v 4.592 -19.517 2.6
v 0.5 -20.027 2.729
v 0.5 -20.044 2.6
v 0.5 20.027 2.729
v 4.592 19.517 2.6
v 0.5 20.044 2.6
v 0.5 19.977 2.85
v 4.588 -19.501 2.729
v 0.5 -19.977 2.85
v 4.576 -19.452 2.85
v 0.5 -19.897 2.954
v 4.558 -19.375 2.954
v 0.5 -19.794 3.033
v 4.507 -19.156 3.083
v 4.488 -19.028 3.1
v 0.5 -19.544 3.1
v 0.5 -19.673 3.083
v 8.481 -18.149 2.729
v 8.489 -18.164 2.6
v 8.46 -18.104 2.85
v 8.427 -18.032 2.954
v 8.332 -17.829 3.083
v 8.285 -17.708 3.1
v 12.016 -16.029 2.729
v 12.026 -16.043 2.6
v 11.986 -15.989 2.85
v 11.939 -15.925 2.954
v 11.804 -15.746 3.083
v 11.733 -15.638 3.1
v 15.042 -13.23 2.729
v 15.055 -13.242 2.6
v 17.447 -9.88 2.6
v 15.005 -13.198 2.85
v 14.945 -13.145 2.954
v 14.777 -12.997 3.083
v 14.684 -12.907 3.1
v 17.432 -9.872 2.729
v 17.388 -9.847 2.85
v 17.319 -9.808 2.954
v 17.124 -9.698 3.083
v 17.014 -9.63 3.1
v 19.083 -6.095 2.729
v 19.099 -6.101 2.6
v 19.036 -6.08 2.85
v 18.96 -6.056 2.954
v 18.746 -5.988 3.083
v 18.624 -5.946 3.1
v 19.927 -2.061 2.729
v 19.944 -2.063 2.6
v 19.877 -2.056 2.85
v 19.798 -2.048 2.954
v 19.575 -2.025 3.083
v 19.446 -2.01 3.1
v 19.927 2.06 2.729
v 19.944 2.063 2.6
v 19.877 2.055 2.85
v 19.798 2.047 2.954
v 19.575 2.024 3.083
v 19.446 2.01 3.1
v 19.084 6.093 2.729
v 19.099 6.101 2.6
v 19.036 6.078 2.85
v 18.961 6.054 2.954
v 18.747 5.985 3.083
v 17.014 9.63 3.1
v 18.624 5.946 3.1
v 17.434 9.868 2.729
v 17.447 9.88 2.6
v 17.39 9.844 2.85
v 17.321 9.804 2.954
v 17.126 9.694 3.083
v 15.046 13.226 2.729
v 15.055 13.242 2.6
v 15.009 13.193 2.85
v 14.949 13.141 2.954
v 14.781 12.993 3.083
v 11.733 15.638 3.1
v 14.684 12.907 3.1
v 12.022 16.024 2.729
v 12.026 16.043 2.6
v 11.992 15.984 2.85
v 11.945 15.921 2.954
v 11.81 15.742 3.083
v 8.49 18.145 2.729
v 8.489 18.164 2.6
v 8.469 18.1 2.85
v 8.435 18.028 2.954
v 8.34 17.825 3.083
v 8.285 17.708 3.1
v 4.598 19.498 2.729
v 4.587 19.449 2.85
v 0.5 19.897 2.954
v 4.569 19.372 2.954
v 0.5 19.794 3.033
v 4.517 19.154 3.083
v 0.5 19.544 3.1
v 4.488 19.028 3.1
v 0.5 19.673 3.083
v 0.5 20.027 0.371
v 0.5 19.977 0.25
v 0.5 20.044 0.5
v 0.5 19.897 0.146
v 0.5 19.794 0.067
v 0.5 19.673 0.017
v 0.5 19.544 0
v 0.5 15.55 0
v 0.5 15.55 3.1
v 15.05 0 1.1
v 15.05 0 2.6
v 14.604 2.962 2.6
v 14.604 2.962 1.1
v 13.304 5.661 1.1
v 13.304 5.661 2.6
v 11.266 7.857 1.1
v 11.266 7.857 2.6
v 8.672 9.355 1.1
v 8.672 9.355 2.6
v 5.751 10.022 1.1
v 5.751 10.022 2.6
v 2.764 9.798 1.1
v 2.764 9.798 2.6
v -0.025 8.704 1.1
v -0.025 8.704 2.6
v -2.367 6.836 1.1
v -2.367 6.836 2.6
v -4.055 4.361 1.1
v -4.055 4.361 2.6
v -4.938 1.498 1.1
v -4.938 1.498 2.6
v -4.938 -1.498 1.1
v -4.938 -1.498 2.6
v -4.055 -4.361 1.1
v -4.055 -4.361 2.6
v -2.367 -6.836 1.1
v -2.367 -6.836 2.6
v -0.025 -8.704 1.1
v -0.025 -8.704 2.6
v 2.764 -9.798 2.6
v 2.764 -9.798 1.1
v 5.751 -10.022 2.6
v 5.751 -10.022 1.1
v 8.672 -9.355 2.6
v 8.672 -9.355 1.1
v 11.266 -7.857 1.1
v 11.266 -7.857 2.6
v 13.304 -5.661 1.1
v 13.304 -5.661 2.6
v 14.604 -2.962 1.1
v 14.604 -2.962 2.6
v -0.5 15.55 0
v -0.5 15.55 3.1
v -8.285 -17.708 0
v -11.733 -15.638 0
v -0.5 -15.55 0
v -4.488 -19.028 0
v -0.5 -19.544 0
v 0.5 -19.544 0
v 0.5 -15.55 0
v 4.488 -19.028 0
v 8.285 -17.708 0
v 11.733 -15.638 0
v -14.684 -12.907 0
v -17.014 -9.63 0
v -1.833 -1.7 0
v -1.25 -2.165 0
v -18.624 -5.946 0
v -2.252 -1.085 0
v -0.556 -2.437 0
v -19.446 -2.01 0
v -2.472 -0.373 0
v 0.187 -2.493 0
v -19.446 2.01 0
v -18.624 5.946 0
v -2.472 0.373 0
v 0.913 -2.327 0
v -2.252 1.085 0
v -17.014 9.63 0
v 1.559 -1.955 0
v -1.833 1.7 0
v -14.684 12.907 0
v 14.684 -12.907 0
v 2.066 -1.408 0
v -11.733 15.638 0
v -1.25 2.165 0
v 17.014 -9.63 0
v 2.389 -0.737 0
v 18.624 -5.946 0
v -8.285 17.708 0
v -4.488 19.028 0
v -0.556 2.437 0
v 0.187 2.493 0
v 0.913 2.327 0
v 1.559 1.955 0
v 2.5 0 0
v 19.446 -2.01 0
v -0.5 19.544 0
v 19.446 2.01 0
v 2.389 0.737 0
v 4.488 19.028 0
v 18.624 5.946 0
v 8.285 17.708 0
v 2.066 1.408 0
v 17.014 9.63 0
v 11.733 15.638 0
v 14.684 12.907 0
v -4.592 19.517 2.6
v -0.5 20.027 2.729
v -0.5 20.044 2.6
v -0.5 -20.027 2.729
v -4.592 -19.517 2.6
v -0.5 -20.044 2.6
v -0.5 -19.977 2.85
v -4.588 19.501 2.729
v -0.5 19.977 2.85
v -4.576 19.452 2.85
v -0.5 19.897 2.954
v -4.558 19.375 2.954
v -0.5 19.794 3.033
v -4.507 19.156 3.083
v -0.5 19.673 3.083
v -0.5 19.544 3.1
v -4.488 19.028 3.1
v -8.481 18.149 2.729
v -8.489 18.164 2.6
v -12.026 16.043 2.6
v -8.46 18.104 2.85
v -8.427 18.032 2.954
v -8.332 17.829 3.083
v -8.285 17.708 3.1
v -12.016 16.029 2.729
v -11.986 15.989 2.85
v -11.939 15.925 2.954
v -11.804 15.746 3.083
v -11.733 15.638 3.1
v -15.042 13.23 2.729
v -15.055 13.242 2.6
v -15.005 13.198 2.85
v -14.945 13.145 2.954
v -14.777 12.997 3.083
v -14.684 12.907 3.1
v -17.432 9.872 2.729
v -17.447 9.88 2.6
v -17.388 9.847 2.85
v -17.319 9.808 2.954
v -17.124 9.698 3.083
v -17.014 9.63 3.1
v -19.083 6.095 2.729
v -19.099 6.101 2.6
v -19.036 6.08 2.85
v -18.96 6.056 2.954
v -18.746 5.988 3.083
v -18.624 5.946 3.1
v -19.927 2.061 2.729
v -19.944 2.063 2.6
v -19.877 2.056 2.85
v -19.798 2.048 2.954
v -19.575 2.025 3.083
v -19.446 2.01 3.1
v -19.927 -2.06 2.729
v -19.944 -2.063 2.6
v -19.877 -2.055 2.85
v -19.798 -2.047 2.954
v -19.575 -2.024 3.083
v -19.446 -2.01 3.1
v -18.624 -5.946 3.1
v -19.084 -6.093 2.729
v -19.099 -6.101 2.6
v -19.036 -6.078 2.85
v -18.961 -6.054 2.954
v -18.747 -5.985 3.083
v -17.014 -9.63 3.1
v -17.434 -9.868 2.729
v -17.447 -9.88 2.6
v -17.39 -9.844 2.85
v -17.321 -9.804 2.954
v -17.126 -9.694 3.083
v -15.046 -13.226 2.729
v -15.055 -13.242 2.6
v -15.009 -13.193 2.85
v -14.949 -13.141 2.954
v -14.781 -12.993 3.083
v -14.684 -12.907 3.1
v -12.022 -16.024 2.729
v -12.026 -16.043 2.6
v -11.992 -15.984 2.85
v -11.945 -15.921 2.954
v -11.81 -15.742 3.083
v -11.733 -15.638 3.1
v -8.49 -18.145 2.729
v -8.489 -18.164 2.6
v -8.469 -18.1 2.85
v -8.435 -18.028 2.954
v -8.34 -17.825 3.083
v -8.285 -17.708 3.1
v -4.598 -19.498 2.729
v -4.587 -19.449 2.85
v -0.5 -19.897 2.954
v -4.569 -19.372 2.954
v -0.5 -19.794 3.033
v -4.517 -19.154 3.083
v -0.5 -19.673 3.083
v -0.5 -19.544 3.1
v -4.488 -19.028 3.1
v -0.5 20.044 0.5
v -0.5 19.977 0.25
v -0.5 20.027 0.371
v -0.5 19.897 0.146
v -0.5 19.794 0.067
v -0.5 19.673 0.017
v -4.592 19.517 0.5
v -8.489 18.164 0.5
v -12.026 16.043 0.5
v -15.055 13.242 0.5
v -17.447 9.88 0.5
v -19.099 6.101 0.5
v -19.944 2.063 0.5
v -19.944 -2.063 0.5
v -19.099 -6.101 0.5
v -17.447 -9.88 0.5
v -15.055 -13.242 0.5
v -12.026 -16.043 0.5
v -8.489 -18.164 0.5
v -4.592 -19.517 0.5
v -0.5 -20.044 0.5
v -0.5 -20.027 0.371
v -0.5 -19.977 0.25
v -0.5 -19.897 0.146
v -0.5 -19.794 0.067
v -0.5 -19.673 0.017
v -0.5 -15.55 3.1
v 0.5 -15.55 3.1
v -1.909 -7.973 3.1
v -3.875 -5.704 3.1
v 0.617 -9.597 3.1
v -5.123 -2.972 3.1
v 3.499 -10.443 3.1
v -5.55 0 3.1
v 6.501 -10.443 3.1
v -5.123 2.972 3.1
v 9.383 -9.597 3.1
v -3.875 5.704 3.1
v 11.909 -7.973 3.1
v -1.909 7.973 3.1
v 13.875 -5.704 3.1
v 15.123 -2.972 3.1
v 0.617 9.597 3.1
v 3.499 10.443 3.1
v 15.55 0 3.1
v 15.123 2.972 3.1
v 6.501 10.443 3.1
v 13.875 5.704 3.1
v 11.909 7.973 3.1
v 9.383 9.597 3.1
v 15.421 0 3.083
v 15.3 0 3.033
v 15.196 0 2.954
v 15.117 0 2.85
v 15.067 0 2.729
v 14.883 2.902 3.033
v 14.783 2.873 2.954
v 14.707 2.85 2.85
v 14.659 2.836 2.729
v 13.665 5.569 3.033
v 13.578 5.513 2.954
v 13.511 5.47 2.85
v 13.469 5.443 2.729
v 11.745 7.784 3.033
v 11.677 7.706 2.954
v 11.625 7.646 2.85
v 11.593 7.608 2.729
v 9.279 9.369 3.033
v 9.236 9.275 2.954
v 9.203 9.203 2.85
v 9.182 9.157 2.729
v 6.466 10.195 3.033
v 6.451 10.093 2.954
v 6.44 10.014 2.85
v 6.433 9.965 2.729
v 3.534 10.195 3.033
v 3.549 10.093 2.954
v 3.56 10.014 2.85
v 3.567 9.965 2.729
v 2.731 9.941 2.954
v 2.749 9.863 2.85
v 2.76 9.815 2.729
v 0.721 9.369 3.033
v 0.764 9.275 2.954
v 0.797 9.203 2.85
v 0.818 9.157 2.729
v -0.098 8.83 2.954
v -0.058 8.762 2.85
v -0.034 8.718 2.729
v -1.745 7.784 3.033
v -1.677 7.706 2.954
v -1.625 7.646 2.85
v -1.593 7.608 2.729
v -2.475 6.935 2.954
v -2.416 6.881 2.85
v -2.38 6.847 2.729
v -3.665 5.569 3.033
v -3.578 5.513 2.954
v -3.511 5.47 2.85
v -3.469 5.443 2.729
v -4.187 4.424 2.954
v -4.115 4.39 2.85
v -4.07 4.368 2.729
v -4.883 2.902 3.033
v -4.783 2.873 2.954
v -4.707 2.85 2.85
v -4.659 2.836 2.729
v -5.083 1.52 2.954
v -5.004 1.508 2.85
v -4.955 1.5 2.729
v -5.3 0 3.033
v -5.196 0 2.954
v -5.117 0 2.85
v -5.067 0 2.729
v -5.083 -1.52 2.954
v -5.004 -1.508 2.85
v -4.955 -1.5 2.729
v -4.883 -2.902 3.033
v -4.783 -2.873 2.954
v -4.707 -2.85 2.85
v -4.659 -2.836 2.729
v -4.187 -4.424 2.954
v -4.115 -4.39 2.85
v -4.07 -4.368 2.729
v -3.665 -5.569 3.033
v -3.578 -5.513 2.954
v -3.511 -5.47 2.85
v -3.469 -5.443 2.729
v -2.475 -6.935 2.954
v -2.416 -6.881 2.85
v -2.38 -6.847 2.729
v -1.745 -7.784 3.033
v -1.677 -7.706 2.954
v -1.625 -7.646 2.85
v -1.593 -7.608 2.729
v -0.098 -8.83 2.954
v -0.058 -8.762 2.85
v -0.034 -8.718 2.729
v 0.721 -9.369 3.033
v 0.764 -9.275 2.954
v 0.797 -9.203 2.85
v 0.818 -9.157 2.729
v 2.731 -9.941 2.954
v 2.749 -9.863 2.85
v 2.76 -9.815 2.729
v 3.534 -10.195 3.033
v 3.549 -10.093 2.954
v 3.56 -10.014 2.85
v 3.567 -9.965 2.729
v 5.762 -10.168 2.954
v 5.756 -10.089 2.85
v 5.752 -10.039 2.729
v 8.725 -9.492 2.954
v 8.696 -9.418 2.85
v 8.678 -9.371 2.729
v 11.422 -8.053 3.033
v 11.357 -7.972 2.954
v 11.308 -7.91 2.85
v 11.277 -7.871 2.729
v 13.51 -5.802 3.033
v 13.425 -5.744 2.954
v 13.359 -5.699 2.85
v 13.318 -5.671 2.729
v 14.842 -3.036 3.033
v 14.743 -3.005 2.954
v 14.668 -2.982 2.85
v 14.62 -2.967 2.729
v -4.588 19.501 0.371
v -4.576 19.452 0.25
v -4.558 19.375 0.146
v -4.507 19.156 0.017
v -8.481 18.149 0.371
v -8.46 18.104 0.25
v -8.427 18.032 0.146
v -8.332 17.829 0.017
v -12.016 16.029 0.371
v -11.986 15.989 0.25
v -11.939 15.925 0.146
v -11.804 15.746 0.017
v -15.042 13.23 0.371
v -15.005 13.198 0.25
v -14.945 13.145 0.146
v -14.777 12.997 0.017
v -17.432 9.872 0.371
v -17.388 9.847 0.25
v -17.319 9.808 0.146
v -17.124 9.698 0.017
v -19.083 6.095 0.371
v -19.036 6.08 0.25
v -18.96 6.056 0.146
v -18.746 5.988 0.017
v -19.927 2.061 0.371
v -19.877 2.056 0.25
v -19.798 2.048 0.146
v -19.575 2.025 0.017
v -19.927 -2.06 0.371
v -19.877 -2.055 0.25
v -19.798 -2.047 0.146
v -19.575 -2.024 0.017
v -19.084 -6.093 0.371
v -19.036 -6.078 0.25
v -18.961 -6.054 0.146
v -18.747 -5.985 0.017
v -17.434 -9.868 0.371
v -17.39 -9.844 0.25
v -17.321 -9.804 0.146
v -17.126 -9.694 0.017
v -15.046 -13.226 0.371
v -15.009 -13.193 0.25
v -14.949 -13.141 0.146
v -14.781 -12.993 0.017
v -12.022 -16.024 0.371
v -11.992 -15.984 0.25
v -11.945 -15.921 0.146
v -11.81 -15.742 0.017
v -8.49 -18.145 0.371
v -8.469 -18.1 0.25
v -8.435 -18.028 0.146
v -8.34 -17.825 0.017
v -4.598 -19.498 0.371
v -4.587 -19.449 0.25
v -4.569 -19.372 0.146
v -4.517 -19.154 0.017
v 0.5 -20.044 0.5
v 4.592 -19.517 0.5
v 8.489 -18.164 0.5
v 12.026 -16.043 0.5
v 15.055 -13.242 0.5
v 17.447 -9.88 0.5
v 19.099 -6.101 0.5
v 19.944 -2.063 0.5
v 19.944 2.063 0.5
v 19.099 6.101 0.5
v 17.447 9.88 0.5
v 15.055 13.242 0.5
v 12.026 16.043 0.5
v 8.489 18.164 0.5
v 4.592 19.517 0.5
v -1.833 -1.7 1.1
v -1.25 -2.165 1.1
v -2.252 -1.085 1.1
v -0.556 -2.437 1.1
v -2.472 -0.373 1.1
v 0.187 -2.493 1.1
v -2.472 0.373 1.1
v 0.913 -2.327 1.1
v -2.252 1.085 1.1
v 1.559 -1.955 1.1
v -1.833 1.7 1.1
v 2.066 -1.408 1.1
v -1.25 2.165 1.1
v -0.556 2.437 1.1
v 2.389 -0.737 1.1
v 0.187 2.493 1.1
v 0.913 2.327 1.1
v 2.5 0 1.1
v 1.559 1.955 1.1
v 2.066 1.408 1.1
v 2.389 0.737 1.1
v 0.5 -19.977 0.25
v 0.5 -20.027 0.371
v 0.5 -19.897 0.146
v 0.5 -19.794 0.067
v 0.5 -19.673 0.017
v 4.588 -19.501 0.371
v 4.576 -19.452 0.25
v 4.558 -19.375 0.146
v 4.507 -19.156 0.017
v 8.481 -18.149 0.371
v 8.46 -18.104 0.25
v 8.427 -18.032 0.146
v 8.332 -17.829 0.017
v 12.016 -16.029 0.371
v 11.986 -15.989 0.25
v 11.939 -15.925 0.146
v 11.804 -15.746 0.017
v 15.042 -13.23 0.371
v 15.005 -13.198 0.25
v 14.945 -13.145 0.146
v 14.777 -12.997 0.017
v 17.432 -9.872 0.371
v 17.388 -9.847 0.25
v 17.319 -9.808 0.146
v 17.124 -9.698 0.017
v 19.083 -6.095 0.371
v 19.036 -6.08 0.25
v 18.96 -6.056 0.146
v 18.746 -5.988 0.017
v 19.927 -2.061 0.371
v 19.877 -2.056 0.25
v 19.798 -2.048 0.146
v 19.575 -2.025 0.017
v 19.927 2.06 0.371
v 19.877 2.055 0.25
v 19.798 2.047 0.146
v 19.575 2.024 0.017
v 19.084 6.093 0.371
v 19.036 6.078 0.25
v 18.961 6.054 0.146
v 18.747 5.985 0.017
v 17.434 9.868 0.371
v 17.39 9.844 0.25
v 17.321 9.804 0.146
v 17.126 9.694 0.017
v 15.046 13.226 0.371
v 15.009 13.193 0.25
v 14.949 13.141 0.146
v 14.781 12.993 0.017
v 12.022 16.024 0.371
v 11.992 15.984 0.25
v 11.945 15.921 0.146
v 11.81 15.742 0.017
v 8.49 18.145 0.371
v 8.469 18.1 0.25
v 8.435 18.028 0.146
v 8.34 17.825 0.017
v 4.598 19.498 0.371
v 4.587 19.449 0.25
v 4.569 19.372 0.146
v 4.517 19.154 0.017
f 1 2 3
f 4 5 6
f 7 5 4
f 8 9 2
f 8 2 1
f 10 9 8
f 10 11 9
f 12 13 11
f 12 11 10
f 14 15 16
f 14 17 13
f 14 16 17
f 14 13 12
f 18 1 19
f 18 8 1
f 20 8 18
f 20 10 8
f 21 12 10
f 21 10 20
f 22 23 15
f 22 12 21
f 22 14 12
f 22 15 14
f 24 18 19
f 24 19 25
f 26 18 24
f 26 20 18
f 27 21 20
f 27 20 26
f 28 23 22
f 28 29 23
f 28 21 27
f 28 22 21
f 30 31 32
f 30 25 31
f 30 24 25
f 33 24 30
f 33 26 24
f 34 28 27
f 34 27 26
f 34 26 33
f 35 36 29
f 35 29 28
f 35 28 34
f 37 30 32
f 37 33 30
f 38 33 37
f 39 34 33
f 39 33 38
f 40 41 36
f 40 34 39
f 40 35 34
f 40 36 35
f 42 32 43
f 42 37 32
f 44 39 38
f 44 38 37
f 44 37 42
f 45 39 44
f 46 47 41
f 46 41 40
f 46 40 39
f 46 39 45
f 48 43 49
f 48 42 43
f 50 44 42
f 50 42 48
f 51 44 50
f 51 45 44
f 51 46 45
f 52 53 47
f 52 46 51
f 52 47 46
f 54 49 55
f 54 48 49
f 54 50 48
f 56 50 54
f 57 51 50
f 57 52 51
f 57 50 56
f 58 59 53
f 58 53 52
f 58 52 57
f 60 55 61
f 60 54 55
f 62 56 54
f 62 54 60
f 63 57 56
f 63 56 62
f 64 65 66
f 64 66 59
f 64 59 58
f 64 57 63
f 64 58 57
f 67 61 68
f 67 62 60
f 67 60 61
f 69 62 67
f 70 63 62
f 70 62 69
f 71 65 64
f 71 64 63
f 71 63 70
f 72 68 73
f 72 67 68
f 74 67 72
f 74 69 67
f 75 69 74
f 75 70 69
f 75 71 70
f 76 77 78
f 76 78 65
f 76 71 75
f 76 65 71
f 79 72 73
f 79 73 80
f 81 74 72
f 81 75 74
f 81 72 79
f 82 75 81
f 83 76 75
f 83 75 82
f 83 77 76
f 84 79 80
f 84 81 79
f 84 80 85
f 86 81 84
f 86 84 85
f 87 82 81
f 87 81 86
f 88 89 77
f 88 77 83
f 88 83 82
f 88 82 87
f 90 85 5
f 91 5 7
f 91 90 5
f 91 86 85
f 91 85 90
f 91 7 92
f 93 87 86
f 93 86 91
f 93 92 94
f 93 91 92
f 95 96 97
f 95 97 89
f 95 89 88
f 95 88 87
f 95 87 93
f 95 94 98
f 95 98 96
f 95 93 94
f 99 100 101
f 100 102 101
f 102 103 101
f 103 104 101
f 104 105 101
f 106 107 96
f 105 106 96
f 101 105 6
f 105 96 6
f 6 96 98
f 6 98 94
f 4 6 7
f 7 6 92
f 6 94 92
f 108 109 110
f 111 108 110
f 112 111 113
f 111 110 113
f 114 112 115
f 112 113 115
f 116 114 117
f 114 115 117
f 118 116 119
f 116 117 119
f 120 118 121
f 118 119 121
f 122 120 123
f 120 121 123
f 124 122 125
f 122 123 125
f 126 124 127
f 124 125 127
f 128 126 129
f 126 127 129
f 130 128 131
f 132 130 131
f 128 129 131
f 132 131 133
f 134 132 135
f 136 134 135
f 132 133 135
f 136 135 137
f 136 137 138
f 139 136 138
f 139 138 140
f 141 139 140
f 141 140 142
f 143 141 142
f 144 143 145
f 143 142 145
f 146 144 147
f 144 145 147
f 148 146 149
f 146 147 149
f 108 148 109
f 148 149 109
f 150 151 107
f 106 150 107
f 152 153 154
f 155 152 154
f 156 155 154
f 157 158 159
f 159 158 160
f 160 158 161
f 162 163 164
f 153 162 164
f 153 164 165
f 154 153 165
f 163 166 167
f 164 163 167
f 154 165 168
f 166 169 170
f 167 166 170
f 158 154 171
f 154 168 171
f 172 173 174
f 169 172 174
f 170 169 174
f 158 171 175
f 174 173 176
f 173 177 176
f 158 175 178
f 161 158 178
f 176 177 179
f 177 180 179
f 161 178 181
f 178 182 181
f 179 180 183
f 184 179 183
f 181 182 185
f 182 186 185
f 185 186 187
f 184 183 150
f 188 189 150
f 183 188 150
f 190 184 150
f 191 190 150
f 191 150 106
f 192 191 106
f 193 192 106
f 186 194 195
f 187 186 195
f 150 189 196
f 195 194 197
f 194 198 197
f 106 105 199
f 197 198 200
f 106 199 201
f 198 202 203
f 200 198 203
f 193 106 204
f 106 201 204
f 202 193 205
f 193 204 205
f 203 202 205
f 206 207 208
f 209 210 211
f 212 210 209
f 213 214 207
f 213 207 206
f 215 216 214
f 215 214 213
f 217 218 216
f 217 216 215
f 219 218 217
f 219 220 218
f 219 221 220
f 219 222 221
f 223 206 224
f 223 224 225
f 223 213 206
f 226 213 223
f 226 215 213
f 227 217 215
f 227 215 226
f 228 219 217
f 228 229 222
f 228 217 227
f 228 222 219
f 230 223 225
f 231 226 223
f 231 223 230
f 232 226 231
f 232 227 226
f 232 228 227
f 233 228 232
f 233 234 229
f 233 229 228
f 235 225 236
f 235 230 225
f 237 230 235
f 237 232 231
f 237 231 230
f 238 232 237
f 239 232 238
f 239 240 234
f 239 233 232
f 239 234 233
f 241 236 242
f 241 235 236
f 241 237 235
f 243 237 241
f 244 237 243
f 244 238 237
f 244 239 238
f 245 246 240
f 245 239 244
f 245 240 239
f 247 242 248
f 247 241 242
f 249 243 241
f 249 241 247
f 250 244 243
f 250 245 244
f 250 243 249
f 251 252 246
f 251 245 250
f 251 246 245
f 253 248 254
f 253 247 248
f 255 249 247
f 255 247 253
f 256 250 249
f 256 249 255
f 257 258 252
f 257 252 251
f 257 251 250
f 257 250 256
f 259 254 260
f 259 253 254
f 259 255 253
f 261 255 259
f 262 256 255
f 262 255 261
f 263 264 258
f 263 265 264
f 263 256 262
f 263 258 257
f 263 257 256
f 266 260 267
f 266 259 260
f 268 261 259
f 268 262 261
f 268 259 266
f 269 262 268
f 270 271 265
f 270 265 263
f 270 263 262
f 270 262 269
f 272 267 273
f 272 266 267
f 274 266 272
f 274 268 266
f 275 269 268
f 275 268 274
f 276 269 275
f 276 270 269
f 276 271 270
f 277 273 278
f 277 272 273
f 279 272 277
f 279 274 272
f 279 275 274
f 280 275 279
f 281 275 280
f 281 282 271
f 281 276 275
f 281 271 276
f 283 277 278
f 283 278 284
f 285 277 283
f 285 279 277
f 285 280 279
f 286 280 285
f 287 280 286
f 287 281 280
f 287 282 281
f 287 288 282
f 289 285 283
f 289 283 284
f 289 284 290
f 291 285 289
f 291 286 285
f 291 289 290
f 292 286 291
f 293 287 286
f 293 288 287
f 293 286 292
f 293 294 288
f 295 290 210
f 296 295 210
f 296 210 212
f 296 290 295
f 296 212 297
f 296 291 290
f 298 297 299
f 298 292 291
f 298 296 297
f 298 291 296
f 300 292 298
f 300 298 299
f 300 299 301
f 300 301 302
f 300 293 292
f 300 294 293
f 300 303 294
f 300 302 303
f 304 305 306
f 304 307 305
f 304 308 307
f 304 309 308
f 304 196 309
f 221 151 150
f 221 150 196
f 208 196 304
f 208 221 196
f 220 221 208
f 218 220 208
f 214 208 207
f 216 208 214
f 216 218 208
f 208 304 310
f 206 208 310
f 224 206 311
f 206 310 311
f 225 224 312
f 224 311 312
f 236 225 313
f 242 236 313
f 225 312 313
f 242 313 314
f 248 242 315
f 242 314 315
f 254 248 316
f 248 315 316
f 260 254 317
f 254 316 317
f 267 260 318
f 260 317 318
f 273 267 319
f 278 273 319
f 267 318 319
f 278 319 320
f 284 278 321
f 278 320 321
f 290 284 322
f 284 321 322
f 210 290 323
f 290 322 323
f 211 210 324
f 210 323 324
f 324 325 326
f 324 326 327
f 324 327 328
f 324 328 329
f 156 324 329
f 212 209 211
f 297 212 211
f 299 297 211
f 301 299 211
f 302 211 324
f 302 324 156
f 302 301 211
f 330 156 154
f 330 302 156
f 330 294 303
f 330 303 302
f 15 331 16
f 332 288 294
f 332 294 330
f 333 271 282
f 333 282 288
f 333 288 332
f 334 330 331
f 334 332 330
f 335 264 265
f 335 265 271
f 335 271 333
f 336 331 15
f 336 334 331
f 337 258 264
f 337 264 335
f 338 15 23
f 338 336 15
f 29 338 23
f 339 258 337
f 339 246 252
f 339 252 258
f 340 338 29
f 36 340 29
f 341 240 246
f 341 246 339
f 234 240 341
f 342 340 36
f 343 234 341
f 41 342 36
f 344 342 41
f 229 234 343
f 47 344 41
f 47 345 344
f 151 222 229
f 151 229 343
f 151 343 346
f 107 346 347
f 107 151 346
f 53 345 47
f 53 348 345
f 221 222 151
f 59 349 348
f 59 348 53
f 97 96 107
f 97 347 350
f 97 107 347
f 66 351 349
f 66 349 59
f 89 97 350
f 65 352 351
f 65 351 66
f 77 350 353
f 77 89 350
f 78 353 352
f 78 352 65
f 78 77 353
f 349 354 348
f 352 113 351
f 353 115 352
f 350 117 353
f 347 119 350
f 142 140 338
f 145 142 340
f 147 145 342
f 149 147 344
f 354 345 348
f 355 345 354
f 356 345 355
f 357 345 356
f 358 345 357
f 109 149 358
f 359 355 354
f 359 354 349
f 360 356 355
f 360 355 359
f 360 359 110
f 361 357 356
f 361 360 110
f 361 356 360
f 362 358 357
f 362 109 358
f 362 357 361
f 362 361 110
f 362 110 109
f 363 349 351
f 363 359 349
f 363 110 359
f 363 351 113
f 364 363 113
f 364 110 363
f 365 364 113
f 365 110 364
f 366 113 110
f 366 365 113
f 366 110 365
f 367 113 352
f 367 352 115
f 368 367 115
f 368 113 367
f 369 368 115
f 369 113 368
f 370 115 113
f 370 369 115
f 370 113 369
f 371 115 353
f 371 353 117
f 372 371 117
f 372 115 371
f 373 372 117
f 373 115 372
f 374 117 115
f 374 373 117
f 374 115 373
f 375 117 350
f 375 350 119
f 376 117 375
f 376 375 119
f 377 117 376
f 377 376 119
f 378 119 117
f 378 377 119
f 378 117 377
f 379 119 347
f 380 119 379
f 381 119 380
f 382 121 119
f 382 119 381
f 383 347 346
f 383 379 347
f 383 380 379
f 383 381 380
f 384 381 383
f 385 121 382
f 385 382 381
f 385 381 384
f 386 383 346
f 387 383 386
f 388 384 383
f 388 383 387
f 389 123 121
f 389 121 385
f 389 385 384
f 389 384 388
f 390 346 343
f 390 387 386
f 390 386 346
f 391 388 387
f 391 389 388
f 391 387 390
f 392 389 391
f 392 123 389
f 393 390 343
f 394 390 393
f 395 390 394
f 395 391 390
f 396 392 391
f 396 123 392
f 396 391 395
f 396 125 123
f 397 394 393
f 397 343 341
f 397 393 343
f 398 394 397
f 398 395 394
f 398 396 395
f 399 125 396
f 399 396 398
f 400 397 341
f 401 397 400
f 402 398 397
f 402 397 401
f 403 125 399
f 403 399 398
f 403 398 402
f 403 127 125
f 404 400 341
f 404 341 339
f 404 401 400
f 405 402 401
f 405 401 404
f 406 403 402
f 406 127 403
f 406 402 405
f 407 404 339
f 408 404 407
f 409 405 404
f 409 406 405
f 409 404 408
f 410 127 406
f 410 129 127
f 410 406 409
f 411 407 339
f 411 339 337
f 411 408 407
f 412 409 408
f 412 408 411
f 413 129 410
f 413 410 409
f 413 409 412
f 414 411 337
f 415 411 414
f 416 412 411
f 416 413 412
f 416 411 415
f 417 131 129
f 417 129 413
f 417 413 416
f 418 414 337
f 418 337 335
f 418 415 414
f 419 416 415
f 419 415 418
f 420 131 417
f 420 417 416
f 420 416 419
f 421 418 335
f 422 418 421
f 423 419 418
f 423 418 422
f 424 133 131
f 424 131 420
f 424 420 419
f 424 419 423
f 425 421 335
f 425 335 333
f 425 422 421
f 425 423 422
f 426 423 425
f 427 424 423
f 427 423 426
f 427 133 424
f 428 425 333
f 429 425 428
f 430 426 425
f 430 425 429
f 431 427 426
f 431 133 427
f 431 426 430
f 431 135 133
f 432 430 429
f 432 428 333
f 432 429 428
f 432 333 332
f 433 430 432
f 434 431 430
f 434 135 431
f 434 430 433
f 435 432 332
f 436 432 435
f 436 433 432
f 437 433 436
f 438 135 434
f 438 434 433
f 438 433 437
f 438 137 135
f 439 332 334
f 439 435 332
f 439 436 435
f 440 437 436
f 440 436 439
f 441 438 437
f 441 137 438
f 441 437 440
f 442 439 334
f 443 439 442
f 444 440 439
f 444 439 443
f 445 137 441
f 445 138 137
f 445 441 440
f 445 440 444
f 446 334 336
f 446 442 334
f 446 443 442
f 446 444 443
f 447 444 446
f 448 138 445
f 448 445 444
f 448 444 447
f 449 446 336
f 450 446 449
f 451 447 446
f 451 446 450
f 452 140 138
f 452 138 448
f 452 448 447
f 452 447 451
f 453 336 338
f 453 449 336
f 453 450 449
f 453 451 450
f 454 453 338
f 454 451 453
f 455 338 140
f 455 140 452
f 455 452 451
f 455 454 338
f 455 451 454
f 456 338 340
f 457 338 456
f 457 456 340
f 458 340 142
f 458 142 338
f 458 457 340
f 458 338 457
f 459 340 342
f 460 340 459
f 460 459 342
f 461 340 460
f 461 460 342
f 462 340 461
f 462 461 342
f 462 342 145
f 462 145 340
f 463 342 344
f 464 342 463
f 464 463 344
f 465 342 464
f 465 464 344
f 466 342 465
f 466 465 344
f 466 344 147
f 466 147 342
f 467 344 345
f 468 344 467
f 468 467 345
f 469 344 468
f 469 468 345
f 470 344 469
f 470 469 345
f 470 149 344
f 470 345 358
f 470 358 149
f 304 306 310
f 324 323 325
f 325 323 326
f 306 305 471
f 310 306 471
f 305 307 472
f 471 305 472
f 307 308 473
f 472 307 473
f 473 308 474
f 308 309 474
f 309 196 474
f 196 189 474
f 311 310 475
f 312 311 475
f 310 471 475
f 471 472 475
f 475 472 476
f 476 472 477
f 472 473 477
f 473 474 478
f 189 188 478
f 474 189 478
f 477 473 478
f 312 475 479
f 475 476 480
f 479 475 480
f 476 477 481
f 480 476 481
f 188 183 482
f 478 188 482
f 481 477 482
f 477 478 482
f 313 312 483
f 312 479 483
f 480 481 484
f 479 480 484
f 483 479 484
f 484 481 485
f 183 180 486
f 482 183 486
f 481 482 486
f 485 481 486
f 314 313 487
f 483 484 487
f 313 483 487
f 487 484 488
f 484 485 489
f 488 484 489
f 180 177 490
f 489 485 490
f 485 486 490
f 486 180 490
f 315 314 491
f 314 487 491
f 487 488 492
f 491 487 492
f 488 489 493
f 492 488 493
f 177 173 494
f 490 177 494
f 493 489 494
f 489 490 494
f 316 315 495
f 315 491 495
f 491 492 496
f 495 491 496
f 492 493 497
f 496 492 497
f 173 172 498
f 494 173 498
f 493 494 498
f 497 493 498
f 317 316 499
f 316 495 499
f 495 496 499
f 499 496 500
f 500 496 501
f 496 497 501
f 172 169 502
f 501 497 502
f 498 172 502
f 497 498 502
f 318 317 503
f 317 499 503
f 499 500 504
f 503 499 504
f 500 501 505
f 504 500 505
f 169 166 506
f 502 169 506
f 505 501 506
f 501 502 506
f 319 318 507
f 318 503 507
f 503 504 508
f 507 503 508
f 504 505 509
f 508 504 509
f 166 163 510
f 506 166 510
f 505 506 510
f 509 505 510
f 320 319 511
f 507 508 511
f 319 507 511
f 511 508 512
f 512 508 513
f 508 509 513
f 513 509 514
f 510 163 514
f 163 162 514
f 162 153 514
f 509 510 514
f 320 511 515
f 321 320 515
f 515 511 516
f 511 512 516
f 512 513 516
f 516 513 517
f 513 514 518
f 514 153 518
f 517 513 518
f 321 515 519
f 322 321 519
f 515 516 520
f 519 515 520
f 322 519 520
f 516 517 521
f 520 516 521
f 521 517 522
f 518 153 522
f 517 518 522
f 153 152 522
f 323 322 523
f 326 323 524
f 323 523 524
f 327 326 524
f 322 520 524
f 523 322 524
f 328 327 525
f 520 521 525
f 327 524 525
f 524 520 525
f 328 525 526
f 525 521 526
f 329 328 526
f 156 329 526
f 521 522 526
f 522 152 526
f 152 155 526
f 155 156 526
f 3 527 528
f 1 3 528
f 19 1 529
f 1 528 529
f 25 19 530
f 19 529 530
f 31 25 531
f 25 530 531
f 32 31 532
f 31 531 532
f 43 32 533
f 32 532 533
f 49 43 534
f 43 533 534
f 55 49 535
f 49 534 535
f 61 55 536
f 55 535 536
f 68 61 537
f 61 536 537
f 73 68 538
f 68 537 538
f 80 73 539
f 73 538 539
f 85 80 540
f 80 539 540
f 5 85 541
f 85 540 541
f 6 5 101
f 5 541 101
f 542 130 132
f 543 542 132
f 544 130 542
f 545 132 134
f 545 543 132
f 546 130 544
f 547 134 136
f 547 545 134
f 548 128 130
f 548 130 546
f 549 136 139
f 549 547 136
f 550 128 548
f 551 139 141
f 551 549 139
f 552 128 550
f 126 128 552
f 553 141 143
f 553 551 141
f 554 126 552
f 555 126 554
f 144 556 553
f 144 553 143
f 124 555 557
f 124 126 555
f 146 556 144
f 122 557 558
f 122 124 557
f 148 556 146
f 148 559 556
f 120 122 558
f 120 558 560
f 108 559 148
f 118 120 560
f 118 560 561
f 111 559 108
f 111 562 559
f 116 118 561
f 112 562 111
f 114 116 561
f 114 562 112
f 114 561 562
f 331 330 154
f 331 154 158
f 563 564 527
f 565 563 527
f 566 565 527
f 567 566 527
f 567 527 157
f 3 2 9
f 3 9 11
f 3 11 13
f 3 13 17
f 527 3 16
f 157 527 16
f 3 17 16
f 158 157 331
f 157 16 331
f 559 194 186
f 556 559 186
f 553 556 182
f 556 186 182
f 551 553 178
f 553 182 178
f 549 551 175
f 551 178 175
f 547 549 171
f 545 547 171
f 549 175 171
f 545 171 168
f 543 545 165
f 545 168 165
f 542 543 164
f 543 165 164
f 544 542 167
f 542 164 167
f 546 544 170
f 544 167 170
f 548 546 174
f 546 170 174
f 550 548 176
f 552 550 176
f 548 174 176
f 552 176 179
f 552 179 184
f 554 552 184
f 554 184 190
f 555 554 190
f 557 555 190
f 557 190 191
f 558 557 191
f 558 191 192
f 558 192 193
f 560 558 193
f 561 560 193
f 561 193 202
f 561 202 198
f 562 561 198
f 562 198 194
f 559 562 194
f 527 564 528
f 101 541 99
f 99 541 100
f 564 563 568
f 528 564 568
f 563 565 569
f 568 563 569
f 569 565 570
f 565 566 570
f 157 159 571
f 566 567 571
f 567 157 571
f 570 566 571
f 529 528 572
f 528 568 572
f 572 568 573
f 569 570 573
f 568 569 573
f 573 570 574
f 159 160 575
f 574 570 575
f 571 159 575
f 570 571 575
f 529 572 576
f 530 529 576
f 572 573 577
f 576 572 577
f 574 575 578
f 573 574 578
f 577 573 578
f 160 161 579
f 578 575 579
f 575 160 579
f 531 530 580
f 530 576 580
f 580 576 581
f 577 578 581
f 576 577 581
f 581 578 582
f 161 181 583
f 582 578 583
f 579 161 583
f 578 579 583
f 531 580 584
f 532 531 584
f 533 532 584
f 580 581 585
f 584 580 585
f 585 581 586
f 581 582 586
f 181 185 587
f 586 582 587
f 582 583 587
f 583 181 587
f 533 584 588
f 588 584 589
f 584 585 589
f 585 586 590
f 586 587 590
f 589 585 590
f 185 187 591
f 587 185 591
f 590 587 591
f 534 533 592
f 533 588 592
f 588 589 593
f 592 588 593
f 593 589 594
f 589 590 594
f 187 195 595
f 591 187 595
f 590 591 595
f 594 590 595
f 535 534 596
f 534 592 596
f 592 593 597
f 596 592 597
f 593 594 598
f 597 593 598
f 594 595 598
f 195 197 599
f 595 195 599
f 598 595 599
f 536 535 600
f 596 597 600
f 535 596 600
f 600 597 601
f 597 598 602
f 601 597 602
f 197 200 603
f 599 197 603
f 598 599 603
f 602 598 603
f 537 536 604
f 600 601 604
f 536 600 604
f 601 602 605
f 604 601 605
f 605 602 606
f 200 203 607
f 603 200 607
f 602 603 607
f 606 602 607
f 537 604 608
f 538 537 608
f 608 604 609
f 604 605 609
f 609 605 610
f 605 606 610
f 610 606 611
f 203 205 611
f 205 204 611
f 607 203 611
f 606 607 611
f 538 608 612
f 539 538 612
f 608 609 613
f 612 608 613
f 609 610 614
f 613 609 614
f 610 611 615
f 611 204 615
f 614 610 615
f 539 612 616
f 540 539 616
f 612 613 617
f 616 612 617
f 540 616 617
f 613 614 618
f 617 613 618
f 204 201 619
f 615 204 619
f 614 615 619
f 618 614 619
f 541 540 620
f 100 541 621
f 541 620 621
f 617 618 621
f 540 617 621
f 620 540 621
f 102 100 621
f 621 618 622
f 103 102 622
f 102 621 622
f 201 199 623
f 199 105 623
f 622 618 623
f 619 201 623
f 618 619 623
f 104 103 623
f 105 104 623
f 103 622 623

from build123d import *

# Parameters (mm, degrees)
F0_R     = 20.05
F1_DEPTH = 3.1
F2_R     = 10.05
F3_DEPTH = 2
F4_R     = 0.5
F5_R     = 2.5
F6_DEPTH = 3.1010001
F7_W     = 1
F7_H     = 5
F8_DEPTH = 3.1010001


with BuildPart() as f1:
    # F0 (on Top) → F1 (new body)
    with BuildSketch(Plane.XY):
        Circle(F0_R)
    extrude(amount=F1_DEPTH)

    # F2 (on face) → F3 (cut)
    with BuildSketch(Plane.XY.offset(3.1)):
        with Locations((5, 0)):
            Circle(F2_R)
    extrude(amount=-F3_DEPTH, mode=Mode.SUBTRACT)

    # F4
    f4_edges = [f1.edges().sort_by_distance(p)[0] for p in [
        (-20.05, 0, 3.1),
        (-5.05, 0, 3.1),
        (-20.05, 0, 0),
    ]]
    fillet(f4_edges, radius=F4_R)

    # F5 (on face) → F6 (cut, through all)
    with BuildSketch(Plane(origin=(0, 0, 0), x_dir=(1, 0, 0), z_dir=(0, 0, -1))):
        Circle(F5_R)
    extrude(amount=-F6_DEPTH, mode=Mode.SUBTRACT)

    # F7 (on face) → F8 (cut, through all)
    with BuildSketch(Plane.XY.offset(3.1)):
        with Locations((0, 18.05)):
            Rectangle(F7_W, F7_H)
        with Locations((0, -18.05)):
            Rectangle(F7_W, F7_H)
    extrude(amount=-F8_DEPTH, mode=Mode.SUBTRACT)


solid = f1.part
